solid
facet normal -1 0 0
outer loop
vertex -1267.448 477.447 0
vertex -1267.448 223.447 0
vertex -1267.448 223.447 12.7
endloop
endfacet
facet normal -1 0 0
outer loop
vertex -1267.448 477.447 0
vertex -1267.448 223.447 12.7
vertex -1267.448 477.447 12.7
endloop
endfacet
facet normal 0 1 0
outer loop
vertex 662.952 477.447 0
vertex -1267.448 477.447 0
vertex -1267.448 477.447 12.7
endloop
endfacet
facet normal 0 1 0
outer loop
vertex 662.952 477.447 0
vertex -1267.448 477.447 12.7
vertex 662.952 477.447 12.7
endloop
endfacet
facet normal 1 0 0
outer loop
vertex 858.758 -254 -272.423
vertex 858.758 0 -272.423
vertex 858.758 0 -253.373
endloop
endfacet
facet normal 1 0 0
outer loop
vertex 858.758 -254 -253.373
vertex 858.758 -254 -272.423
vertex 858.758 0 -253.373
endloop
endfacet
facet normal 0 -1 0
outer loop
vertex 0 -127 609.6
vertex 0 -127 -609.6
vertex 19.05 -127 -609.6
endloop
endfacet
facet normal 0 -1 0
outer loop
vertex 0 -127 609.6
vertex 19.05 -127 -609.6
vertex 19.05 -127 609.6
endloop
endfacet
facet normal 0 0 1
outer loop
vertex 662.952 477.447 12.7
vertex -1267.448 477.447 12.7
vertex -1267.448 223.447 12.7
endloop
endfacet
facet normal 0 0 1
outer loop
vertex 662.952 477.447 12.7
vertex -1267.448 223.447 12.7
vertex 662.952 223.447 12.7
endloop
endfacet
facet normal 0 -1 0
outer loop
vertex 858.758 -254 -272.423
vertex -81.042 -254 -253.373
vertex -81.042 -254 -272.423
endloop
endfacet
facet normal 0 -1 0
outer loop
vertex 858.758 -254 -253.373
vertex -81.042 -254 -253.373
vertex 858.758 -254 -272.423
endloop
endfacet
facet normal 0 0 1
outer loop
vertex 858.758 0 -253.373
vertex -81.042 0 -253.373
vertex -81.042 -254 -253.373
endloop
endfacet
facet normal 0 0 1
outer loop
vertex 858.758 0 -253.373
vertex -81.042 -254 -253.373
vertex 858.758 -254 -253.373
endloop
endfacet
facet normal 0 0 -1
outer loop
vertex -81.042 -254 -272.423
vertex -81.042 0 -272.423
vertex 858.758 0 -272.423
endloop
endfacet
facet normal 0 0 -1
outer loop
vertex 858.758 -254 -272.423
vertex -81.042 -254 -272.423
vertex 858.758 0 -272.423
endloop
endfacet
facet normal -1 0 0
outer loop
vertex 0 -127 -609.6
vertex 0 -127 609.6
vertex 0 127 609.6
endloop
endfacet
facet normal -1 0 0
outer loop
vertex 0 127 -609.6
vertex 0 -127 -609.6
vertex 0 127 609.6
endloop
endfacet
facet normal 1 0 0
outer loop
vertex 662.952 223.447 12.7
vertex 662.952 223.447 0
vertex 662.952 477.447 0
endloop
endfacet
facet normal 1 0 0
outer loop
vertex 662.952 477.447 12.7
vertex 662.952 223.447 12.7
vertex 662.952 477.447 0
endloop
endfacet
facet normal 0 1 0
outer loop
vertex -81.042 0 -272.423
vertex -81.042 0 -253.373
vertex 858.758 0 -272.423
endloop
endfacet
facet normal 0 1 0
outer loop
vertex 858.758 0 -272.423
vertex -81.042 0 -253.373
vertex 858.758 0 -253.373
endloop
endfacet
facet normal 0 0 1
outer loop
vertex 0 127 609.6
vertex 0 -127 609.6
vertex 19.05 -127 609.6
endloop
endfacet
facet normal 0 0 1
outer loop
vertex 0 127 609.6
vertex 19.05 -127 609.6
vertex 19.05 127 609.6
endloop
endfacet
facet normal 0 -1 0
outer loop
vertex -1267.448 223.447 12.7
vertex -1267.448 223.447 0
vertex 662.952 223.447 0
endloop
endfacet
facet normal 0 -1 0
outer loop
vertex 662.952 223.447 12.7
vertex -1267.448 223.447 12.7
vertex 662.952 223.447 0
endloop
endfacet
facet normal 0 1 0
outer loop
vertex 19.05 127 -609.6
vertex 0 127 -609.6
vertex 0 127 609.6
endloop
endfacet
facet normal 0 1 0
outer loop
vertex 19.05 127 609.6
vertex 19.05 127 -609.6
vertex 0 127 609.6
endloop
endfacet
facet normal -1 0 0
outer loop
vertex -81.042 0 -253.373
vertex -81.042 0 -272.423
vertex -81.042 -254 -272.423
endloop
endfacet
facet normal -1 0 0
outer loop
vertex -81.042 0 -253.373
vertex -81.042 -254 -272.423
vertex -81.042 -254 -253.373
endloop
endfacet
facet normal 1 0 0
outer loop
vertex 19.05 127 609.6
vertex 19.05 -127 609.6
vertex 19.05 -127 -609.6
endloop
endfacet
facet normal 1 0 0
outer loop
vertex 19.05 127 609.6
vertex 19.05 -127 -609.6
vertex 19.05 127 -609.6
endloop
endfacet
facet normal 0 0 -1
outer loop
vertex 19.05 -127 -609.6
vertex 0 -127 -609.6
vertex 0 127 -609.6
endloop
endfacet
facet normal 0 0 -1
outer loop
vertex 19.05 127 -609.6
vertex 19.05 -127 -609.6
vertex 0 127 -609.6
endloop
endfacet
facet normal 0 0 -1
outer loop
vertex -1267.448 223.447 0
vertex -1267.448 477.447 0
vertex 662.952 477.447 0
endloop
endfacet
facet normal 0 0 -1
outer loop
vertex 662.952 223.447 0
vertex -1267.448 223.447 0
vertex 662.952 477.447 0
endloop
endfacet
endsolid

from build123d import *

# Parameters (mm, degrees)
F0_W     = 254
F0_H     = 1219.2
F1_DEPTH = 19.05
F2_W     = 1930.4
F2_H     = 254
F3_DEPTH = 12.7
F4_W     = 939.8
F4_H     = 19.05
F5_DEPTH = 254


with BuildPart() as f1:
    # F0 (on Right) → F1 (new body)
    with BuildSketch(Plane.YZ):
        Rectangle(F0_W, F0_H)
    extrude(amount=F1_DEPTH)


with BuildPart() as f3:
    # F2 (on Top) → F3 (new body)
    with BuildSketch(Plane.XY):
        with Locations((-302.248406, 350.446586)):
            Rectangle(F2_W, F2_H)
    extrude(amount=F3_DEPTH)


with BuildPart() as f5:
    # F4 (on Front) → F5 (new body)
    with BuildSketch(Plane.XZ):
        with Locations((388.857713, -262.897536)):
            Rectangle(F4_W, F4_H)
    extrude(amount=F5_DEPTH)


solid = Compound([f1.part, f3.part, f5.part])
